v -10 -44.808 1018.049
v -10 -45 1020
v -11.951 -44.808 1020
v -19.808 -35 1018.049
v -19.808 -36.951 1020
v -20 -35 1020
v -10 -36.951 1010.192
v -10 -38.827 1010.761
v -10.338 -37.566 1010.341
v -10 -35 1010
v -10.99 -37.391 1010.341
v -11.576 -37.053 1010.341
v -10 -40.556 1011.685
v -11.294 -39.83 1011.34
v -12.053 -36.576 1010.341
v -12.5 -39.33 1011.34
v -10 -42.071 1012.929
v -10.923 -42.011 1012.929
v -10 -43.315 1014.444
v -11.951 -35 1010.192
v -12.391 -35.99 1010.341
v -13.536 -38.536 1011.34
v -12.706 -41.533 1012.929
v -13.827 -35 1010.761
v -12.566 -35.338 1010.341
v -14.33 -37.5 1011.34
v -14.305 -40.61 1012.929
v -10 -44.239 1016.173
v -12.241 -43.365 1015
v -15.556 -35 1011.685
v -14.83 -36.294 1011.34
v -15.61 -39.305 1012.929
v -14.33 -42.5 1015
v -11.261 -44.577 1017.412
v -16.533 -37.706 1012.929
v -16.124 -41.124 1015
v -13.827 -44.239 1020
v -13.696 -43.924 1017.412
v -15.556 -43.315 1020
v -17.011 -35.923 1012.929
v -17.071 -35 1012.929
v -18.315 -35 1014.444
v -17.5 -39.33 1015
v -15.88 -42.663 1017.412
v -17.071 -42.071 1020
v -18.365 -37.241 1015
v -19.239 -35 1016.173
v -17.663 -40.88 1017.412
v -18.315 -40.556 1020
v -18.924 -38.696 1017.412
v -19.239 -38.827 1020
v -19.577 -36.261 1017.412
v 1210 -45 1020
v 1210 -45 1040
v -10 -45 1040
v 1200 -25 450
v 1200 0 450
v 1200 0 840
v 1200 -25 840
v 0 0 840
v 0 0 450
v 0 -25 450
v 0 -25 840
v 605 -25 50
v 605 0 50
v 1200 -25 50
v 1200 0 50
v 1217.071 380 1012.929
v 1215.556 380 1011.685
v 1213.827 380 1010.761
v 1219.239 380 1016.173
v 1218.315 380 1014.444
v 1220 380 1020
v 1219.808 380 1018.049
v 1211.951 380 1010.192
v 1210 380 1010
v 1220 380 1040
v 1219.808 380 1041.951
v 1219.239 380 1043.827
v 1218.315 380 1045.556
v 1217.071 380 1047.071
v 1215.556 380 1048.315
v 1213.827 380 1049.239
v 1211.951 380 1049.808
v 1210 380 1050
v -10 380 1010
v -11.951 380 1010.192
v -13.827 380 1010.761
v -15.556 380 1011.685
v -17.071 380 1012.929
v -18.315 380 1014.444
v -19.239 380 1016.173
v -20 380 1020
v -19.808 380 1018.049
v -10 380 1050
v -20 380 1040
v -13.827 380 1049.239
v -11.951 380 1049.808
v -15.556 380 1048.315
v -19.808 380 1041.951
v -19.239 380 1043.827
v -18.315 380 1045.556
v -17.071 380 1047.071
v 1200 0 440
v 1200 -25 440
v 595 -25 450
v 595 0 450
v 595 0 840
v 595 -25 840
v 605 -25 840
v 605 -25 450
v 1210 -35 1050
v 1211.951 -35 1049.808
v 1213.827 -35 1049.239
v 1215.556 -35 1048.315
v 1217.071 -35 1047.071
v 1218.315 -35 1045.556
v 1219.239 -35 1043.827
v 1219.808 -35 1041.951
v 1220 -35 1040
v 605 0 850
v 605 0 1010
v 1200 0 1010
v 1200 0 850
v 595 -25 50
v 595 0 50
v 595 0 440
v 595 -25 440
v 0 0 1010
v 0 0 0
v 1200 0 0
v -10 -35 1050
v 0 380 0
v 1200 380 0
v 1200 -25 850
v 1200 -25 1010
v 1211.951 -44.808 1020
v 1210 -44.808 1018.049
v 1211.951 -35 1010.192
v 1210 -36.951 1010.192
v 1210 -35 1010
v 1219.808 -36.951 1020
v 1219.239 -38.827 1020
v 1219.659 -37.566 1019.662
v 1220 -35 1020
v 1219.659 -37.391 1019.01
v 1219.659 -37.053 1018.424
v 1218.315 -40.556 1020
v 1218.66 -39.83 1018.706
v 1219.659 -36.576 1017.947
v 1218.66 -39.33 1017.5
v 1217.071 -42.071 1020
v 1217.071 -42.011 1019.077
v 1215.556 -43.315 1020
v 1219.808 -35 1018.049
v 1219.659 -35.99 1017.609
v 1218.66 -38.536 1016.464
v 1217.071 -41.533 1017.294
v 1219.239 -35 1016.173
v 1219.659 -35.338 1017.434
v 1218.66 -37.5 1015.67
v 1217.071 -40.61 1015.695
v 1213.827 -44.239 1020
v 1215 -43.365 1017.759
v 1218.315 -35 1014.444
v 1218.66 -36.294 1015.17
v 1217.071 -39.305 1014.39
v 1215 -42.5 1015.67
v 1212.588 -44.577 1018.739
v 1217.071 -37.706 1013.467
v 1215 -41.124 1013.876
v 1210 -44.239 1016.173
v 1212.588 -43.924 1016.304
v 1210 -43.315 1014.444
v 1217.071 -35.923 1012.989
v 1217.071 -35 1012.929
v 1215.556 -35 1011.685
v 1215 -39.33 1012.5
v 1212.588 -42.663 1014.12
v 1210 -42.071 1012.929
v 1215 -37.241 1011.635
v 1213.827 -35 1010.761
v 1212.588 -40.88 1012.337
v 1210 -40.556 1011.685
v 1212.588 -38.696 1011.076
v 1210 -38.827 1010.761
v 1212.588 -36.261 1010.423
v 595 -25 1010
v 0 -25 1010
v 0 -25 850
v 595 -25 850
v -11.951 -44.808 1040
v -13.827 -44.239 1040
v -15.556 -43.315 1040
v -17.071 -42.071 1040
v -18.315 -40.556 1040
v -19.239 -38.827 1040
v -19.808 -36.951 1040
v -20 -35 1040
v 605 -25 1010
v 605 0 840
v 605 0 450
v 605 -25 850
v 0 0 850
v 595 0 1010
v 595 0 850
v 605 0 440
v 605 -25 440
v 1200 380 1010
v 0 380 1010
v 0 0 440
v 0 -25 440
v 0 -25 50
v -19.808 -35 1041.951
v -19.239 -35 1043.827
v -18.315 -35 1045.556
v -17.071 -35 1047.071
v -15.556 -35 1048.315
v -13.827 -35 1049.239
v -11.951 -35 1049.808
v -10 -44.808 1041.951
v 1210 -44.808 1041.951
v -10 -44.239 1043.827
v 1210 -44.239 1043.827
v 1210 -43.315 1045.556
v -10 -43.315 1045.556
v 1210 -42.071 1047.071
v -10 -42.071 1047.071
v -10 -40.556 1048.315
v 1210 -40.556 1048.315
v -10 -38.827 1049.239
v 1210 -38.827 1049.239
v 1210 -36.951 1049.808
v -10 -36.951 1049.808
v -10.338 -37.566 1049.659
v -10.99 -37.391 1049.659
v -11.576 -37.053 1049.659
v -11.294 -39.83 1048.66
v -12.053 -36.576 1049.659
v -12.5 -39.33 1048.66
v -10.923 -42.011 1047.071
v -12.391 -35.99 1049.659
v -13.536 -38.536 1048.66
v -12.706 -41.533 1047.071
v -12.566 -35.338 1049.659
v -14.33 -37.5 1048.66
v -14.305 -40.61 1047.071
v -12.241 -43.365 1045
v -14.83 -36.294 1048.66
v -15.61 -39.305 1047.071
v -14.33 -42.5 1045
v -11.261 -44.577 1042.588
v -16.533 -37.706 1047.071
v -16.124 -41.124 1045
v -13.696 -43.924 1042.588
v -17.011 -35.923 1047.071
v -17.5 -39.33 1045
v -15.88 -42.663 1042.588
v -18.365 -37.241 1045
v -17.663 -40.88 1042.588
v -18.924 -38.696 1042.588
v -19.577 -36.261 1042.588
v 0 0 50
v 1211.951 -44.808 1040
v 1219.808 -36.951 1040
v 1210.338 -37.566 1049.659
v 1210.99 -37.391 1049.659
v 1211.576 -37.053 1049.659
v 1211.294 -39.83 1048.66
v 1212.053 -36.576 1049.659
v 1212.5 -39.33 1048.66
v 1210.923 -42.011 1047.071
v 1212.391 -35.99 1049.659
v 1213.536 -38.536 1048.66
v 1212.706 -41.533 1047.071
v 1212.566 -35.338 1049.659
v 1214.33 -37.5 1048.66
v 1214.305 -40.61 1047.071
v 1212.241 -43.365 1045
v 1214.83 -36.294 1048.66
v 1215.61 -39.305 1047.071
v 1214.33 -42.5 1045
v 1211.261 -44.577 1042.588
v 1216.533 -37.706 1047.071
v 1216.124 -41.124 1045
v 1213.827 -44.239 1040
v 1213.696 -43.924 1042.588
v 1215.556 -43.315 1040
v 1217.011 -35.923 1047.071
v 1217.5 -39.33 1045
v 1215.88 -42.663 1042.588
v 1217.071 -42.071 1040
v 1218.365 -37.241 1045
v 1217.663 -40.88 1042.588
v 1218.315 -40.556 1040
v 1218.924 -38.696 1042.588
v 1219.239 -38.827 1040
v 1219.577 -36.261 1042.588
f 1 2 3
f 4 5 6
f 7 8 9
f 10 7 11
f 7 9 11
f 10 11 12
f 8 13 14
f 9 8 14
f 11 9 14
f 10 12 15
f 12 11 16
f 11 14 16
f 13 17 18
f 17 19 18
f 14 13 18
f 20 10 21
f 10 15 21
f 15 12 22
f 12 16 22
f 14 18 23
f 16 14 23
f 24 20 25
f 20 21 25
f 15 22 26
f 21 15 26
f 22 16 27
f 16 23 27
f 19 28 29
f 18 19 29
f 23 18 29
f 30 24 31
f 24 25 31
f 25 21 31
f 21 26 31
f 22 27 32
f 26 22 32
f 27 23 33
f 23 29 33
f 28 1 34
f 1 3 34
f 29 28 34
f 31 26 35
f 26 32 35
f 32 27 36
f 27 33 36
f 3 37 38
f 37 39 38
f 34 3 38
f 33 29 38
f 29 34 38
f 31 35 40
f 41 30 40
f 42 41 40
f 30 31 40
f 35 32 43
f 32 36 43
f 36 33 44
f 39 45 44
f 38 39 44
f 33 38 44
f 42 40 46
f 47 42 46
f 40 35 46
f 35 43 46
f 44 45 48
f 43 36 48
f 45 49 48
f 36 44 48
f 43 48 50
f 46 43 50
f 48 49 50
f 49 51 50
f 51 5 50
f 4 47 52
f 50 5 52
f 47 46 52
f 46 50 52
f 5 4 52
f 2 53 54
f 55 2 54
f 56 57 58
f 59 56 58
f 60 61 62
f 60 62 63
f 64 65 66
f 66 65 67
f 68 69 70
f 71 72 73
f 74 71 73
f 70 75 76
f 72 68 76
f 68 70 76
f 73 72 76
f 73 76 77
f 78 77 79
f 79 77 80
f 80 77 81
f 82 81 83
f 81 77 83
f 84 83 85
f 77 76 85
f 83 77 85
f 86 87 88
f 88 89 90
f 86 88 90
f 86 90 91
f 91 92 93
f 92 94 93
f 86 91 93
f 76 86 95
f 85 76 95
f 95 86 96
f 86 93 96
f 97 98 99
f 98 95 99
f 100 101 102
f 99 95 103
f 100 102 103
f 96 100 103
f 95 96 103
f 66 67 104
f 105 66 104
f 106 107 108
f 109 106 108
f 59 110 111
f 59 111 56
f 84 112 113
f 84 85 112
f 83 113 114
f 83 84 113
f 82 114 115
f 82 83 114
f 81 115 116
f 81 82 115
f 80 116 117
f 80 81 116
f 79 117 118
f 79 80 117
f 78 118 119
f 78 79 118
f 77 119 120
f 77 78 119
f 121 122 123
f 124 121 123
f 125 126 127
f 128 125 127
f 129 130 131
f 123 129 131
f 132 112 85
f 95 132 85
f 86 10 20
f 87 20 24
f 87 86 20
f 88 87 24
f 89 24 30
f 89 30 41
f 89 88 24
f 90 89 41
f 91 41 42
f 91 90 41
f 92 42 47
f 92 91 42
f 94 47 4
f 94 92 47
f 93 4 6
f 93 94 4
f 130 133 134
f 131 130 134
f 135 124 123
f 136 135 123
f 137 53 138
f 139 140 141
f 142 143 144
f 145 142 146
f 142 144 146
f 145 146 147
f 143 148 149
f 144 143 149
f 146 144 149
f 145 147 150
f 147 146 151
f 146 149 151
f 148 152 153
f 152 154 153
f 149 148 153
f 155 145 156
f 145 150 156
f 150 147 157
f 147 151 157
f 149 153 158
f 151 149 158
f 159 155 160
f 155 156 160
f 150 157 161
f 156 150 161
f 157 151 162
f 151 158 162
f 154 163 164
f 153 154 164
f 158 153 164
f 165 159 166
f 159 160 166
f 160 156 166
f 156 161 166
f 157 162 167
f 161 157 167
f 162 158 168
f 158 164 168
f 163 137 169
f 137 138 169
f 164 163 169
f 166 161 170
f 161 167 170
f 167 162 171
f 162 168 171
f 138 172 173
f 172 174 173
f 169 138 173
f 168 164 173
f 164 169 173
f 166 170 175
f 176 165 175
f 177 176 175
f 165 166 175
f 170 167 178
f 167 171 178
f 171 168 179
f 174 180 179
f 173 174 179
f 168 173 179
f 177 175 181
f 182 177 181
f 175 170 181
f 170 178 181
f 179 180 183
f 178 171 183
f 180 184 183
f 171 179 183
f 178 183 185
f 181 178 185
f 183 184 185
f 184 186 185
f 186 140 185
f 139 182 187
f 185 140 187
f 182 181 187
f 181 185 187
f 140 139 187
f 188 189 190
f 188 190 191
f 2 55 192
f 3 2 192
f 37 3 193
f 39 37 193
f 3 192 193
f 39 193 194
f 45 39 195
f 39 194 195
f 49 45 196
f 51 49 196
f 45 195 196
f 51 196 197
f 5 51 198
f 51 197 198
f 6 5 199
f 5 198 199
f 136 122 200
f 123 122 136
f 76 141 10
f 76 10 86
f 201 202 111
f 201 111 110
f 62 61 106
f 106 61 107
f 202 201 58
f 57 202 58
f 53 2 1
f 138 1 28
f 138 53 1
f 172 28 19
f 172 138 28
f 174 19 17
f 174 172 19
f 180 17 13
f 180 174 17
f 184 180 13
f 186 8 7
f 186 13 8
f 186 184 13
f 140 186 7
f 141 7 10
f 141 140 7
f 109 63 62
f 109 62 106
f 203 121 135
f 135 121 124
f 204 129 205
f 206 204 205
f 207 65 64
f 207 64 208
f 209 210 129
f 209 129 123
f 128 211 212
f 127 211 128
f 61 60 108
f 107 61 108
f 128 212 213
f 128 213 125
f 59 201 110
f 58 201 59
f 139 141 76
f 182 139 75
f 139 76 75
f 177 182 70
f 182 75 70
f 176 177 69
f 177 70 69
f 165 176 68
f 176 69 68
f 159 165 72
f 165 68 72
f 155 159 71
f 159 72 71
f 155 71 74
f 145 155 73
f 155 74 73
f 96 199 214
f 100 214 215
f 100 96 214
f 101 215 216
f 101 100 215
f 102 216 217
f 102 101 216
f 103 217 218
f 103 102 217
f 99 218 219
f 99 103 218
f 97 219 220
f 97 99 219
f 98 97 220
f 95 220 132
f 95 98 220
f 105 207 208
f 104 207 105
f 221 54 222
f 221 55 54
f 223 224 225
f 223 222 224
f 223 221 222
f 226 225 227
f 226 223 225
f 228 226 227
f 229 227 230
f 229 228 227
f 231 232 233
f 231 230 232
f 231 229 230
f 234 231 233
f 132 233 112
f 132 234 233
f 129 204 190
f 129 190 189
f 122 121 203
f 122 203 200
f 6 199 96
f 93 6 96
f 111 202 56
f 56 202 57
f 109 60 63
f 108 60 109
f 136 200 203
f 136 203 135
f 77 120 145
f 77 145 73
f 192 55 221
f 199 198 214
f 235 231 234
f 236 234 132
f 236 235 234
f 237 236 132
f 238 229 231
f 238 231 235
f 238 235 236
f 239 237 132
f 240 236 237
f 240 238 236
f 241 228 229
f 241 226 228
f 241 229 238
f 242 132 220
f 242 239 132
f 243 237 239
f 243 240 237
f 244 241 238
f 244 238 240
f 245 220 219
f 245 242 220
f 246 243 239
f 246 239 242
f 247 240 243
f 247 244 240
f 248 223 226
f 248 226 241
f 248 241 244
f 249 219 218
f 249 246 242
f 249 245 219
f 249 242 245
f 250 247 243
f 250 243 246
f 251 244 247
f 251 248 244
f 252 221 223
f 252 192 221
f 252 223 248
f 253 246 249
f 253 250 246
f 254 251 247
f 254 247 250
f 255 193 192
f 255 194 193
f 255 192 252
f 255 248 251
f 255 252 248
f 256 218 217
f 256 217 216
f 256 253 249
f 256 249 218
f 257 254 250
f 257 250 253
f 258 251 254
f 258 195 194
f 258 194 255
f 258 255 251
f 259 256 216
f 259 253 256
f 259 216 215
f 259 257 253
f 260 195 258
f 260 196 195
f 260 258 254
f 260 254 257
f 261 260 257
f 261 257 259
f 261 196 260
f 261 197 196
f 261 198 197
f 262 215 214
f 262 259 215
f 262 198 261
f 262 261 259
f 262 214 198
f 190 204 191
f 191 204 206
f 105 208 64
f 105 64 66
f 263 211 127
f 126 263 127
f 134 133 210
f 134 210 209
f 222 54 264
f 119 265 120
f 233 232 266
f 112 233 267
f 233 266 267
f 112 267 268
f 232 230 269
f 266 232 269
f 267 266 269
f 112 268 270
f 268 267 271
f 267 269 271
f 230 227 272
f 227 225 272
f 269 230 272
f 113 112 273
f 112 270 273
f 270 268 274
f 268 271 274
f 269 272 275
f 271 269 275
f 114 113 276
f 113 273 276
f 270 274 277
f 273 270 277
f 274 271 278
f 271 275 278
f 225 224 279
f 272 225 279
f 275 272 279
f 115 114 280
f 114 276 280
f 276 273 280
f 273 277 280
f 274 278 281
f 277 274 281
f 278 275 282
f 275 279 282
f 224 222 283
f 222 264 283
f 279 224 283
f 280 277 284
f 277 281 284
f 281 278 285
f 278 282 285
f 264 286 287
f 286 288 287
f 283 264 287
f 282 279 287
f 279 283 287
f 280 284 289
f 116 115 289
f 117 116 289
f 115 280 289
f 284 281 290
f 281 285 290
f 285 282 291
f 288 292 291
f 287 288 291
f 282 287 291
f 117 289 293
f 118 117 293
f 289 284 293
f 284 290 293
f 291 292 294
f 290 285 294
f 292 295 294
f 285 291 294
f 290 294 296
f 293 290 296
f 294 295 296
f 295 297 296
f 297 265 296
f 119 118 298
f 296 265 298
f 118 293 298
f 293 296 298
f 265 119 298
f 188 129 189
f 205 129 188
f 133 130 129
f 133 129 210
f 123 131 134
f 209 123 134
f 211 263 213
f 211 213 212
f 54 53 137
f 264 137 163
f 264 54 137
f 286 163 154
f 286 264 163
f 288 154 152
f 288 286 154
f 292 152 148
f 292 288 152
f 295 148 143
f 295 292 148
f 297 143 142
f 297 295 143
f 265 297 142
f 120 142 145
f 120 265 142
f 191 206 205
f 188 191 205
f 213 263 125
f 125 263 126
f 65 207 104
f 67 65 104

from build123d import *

# Parameters (mm, degrees)
F1_W          = 1200
F1_H          = 380
F2_DEPTH      = 1010
F3_W          = 595
F3_H          = 390
F4_DEPTH      = 25
F3_H_2        = 160
F5_W          = 425
F5_H          = 40
F6_DEPTH      = 1220
F6_DEPTH_BACK = 20
F7_R          = 10


with BuildPart() as f2:
    # F1 (on Top) → F2 (new body)
    with BuildSketch(Plane.XY):
        with Locations((600, 190)):
            Rectangle(F1_W, F1_H)
    extrude(amount=F2_DEPTH)


with BuildPart() as f4:
    # F3 (on face) → F4 (new body)
    with BuildSketch(Plane.XZ):
        with Locations((297.5, 245)):
            Rectangle(F3_W, F3_H)
    extrude(amount=F4_DEPTH)


with BuildPart() as f4b:
    # F3 (on face) → F4, piece 2 (new body)
    with BuildSketch(Plane.XZ):
        with Locations((902.5, 245)):
            Rectangle(F3_W, F3_H)
    extrude(amount=F4_DEPTH)


with BuildPart() as f4c:
    # F3 (on face) → F4, piece 3 (new body)
    with BuildSketch(Plane.XZ):
        with Locations((297.5, 645)):
            Rectangle(F3_W, F3_H)
    extrude(amount=F4_DEPTH)


with BuildPart() as f4d:
    # F3 (on face) → F4, piece 4 (new body)
    with BuildSketch(Plane.XZ):
        with Locations((902.5, 645)):
            Rectangle(F3_W, F3_H)
    extrude(amount=F4_DEPTH)


with BuildPart() as f4e:
    # F3 (on face) → F4, piece 5 (new body)
    with BuildSketch(Plane.XZ):
        with Locations((297.5, 930)):
            Rectangle(F3_W, F3_H_2)
    extrude(amount=F4_DEPTH)


with BuildPart() as f4f:
    # F3 (on face) → F4, piece 6 (new body)
    with BuildSketch(Plane.XZ):
        with Locations((902.5, 930)):
            Rectangle(F3_W, F3_H_2)
    extrude(amount=F4_DEPTH)


with BuildPart() as f6:
    # F5 (on face) → F6 (new body, two sides)
    with BuildSketch(Plane.YZ.offset(1200)) as f6_sk:
        with Locations((167.5, 1030)):
            Rectangle(F5_W, F5_H)
    extrude(amount=-F6_DEPTH)
    extrude(f6_sk.sketch, amount=F6_DEPTH_BACK)

    # F7
    f7_edges = [f6.edges().sort_by_distance(p)[0] for p in [
        (-20, -45, 1030),
        (600, -45, 1010),
        (1220, -45, 1030),
        (600, -45, 1050),
        (1220, 167.5, 1010),
        (1220, 167.5, 1050),
        (-20, 167.5, 1050),
        (-20, 167.5, 1010),
    ]]
    fillet(f7_edges, radius=F7_R)


solid = Compound([f2.part, f4.part, f4b.part, f4c.part, f4d.part, f4e.part, f4f.part, f6.part])
